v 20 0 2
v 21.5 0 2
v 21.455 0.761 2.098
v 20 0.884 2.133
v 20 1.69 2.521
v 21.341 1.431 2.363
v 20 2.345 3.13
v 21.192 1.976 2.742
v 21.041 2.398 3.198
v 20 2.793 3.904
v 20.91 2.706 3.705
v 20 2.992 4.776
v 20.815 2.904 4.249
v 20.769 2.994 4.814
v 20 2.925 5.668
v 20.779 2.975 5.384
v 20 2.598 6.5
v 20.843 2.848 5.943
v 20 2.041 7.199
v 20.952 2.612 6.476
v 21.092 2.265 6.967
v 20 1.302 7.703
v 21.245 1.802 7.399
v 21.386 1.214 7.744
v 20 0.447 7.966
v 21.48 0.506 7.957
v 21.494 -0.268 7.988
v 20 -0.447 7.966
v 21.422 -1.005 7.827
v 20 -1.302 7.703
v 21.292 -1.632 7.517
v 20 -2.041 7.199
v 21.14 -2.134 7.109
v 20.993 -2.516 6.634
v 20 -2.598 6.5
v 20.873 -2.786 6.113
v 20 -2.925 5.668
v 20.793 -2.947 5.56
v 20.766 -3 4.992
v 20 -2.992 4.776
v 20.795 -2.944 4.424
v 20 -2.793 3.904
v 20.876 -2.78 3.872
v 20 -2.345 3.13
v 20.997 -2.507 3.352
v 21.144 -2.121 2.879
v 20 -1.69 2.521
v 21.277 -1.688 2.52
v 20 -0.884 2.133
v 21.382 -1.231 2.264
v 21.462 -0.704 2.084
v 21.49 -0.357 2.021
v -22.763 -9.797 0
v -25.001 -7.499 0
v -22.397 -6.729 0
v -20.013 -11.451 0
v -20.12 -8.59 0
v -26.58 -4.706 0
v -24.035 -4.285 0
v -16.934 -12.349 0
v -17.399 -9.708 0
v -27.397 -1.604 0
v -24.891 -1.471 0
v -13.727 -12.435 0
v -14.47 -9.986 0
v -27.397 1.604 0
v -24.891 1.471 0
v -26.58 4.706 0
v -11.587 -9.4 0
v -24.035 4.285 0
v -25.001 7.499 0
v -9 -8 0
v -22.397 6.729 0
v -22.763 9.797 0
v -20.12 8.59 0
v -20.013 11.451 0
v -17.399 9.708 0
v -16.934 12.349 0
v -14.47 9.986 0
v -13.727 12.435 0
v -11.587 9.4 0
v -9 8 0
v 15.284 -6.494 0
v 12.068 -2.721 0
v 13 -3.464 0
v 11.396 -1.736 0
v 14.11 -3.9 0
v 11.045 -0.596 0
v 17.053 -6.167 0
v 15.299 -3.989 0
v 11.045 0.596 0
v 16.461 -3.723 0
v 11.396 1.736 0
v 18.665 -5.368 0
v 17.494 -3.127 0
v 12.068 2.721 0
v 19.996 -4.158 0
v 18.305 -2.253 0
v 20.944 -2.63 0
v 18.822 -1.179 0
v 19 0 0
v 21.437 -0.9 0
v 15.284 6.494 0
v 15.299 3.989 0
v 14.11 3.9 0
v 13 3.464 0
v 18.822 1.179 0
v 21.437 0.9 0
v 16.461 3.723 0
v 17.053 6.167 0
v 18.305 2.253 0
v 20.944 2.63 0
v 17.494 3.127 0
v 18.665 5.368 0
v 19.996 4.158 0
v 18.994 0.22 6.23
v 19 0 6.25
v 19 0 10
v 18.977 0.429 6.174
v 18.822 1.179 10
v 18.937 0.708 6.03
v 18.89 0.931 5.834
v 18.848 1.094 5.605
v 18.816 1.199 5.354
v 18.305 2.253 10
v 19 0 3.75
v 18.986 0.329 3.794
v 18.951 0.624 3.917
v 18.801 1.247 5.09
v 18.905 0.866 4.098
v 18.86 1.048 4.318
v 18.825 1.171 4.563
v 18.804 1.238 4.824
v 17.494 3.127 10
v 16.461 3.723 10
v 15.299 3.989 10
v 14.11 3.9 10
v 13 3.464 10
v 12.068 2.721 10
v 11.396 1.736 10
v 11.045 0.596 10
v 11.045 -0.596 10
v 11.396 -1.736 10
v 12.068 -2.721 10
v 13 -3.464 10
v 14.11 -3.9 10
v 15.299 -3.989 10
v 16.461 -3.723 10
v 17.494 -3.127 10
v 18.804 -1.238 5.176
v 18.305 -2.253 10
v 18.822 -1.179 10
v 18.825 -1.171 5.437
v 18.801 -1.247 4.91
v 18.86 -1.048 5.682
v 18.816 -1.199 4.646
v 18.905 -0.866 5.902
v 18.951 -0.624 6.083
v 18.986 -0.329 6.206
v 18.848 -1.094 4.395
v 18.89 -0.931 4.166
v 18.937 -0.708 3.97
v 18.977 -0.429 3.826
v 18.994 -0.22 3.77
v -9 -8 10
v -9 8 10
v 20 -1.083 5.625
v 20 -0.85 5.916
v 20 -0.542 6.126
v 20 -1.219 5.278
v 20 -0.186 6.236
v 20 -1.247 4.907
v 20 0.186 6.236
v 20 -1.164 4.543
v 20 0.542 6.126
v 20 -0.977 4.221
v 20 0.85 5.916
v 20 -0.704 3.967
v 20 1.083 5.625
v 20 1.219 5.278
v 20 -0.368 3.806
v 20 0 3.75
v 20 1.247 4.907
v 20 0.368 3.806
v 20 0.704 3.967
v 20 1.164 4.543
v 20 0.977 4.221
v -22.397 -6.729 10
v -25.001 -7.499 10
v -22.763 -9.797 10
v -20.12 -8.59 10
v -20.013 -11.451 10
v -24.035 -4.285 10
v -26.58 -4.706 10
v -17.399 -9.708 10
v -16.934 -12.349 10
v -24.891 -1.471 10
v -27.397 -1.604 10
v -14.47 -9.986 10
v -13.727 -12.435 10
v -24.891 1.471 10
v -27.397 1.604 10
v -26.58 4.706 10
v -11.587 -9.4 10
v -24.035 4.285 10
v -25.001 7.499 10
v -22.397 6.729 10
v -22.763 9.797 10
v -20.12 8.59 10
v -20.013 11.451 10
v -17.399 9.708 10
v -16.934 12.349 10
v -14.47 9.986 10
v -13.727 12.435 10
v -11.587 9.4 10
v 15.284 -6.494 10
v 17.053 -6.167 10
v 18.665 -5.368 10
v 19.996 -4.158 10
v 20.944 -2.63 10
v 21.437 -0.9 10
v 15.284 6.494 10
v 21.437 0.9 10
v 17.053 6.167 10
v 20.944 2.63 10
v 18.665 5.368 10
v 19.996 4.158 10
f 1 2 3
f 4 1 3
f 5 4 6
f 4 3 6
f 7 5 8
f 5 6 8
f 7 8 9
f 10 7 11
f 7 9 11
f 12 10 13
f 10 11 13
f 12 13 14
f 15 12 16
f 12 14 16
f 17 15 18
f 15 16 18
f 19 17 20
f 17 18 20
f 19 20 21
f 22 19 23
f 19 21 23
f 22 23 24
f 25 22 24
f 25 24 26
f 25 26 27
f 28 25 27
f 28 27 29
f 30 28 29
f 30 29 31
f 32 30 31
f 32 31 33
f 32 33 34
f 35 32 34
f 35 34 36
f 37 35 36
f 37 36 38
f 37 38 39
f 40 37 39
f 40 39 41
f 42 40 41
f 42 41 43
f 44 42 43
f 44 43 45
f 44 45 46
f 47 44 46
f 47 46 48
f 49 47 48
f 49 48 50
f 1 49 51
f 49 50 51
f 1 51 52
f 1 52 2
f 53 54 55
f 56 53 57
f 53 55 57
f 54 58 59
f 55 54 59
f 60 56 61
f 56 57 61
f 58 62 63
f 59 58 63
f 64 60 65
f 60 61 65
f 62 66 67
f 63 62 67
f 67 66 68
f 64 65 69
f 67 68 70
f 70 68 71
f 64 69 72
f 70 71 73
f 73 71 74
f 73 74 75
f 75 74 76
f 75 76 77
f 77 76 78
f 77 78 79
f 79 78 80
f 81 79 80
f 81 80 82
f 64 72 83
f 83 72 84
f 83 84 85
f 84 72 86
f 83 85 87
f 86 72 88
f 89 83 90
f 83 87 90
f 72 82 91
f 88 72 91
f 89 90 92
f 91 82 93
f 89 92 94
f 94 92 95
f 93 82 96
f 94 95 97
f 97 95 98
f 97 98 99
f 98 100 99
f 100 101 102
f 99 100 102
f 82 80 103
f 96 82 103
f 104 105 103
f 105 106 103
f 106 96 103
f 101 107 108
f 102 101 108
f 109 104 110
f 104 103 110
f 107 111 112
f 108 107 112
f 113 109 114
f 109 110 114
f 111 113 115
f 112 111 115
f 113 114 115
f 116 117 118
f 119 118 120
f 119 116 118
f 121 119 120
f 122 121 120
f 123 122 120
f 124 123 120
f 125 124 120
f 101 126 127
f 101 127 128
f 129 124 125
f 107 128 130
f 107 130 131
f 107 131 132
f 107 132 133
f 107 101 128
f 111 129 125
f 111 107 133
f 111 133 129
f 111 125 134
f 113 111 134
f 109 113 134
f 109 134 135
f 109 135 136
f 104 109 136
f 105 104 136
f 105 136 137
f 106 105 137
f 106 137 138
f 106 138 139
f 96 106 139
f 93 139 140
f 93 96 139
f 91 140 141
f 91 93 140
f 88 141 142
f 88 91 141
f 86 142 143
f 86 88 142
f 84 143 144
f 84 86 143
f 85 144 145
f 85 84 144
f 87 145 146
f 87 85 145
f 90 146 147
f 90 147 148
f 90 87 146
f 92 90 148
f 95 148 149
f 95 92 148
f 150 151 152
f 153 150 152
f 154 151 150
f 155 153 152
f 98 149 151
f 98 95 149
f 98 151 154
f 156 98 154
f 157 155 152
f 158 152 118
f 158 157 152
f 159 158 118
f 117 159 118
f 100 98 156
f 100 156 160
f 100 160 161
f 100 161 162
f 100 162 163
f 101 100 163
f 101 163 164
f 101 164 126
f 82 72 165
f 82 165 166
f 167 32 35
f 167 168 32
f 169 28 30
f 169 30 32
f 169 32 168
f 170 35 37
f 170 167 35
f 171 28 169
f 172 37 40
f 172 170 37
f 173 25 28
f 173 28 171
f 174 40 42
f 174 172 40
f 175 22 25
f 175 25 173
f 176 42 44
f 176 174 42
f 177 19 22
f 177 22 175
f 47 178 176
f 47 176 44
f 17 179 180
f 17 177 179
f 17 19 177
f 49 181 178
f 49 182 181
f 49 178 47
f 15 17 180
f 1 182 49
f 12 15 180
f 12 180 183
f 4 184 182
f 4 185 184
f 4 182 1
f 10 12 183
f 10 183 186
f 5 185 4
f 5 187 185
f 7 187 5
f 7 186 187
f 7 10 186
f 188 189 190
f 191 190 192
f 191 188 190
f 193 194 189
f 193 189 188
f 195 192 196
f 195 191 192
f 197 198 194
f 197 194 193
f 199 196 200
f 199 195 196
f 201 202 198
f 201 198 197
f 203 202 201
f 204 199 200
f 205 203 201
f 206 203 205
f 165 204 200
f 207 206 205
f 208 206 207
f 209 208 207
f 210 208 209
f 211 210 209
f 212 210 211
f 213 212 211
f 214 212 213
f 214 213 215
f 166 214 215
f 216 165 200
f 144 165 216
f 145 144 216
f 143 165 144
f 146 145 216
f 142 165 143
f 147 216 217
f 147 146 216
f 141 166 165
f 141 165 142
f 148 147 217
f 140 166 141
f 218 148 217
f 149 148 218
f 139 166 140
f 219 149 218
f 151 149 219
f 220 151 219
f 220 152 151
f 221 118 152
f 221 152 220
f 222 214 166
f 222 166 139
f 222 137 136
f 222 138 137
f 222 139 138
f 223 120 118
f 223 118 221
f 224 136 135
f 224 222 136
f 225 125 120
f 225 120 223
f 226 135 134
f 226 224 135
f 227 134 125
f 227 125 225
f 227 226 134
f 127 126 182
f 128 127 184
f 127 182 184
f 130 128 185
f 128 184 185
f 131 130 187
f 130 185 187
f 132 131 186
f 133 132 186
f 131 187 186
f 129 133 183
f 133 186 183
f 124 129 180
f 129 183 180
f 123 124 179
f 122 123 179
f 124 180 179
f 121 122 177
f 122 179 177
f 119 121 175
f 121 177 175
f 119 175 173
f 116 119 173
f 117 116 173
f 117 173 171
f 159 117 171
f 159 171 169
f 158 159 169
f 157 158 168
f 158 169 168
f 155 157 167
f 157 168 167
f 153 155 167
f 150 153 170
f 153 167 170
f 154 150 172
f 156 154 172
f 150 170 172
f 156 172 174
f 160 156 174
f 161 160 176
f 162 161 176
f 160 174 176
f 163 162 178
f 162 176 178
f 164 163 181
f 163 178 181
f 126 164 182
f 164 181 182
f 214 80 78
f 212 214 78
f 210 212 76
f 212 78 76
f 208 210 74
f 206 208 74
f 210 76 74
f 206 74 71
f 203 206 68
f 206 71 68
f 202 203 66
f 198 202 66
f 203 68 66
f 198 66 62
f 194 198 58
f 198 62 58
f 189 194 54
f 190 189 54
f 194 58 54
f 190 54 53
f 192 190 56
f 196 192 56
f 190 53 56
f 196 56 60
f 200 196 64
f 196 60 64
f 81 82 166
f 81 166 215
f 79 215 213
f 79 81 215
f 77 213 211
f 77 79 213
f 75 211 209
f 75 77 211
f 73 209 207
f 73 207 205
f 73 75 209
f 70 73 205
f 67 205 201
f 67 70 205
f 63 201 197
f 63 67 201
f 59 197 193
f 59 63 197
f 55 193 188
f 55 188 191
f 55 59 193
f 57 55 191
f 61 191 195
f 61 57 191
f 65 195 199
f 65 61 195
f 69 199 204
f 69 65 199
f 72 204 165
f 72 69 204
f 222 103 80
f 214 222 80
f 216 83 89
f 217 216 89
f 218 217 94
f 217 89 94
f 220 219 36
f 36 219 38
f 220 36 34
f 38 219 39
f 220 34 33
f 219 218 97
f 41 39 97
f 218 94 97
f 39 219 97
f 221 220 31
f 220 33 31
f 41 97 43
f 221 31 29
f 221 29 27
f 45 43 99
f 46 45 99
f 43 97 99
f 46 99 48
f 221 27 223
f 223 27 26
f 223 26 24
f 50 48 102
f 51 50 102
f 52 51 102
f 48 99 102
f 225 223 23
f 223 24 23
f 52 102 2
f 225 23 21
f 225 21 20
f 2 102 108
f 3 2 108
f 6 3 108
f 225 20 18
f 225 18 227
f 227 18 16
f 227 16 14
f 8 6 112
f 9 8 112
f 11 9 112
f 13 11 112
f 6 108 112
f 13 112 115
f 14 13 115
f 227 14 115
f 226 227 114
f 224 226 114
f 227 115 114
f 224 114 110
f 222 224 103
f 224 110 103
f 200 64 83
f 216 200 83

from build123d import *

# Parameters (mm, degrees)
SKETCH1_R           = 4
BOSS_EXTRUDE1_DEPTH = 10
CUT_EXTRUDE1_DEPTH  = 7
SKETCH3_R           = 3
CUT_EXTRUDE2_DEPTH  = 2


with BuildPart() as part:
    # Sketch1 → Boss-Extrude1 (new body)
    with BuildSketch(Plane.XY):
        with BuildLine():
            Line((15.283584765, 6.493810875), (-13.726969973, 12.435006817))
            ThreePointArc((-13.726969973, 12.435006817), (-27.5, 0), (-13.726969973, -12.435006817))
            Line((-13.726969973, -12.435006817), (15.283584765, -6.493810875))
            ThreePointArc((15.283584765, -6.493810875), (21.5, 0), (15.283584765, 6.493810875))
        make_face()
        with Locations((15, 0)):
            Circle(SKETCH1_R, mode=Mode.SUBTRACT)
        with BuildLine():
            Line((-9, -8), (-9, 8))
            ThreePointArc((-9, 8), (-25, 0), (-9, -8))
        make_face(mode=Mode.SUBTRACT)
    extrude(amount=BOSS_EXTRUDE1_DEPTH)

    # Sketch2 → Cut-Extrude1 (cut)
    with BuildSketch(Plane(origin=(22, 0, 0), x_dir=(0, 0, -1), z_dir=(1, 0, 0))):
        with BuildLine():
            ThreePointArc((-6.25, 0), (-5, -1.25), (-3.75, 0))
            Line((-3.75, 0), (-6.25, 0))
        make_face()
        with BuildLine():
            Line((-6.25, 0), (-3.75, 0))
            ThreePointArc((-3.75, 0), (-5, 1.25), (-6.25, 0))
        make_face()
    extrude(amount=-CUT_EXTRUDE1_DEPTH, mode=Mode.SUBTRACT)

    # Sketch3 → Cut-Extrude2 (cut)
    with BuildSketch(Plane(origin=(22, 0, 0), x_dir=(0, 0, -1), z_dir=(1, 0, 0))):
        with Locations((-5, 0)):
            Circle(SKETCH3_R)
    extrude(amount=-CUT_EXTRUDE2_DEPTH, mode=Mode.SUBTRACT)


solid = part.part
